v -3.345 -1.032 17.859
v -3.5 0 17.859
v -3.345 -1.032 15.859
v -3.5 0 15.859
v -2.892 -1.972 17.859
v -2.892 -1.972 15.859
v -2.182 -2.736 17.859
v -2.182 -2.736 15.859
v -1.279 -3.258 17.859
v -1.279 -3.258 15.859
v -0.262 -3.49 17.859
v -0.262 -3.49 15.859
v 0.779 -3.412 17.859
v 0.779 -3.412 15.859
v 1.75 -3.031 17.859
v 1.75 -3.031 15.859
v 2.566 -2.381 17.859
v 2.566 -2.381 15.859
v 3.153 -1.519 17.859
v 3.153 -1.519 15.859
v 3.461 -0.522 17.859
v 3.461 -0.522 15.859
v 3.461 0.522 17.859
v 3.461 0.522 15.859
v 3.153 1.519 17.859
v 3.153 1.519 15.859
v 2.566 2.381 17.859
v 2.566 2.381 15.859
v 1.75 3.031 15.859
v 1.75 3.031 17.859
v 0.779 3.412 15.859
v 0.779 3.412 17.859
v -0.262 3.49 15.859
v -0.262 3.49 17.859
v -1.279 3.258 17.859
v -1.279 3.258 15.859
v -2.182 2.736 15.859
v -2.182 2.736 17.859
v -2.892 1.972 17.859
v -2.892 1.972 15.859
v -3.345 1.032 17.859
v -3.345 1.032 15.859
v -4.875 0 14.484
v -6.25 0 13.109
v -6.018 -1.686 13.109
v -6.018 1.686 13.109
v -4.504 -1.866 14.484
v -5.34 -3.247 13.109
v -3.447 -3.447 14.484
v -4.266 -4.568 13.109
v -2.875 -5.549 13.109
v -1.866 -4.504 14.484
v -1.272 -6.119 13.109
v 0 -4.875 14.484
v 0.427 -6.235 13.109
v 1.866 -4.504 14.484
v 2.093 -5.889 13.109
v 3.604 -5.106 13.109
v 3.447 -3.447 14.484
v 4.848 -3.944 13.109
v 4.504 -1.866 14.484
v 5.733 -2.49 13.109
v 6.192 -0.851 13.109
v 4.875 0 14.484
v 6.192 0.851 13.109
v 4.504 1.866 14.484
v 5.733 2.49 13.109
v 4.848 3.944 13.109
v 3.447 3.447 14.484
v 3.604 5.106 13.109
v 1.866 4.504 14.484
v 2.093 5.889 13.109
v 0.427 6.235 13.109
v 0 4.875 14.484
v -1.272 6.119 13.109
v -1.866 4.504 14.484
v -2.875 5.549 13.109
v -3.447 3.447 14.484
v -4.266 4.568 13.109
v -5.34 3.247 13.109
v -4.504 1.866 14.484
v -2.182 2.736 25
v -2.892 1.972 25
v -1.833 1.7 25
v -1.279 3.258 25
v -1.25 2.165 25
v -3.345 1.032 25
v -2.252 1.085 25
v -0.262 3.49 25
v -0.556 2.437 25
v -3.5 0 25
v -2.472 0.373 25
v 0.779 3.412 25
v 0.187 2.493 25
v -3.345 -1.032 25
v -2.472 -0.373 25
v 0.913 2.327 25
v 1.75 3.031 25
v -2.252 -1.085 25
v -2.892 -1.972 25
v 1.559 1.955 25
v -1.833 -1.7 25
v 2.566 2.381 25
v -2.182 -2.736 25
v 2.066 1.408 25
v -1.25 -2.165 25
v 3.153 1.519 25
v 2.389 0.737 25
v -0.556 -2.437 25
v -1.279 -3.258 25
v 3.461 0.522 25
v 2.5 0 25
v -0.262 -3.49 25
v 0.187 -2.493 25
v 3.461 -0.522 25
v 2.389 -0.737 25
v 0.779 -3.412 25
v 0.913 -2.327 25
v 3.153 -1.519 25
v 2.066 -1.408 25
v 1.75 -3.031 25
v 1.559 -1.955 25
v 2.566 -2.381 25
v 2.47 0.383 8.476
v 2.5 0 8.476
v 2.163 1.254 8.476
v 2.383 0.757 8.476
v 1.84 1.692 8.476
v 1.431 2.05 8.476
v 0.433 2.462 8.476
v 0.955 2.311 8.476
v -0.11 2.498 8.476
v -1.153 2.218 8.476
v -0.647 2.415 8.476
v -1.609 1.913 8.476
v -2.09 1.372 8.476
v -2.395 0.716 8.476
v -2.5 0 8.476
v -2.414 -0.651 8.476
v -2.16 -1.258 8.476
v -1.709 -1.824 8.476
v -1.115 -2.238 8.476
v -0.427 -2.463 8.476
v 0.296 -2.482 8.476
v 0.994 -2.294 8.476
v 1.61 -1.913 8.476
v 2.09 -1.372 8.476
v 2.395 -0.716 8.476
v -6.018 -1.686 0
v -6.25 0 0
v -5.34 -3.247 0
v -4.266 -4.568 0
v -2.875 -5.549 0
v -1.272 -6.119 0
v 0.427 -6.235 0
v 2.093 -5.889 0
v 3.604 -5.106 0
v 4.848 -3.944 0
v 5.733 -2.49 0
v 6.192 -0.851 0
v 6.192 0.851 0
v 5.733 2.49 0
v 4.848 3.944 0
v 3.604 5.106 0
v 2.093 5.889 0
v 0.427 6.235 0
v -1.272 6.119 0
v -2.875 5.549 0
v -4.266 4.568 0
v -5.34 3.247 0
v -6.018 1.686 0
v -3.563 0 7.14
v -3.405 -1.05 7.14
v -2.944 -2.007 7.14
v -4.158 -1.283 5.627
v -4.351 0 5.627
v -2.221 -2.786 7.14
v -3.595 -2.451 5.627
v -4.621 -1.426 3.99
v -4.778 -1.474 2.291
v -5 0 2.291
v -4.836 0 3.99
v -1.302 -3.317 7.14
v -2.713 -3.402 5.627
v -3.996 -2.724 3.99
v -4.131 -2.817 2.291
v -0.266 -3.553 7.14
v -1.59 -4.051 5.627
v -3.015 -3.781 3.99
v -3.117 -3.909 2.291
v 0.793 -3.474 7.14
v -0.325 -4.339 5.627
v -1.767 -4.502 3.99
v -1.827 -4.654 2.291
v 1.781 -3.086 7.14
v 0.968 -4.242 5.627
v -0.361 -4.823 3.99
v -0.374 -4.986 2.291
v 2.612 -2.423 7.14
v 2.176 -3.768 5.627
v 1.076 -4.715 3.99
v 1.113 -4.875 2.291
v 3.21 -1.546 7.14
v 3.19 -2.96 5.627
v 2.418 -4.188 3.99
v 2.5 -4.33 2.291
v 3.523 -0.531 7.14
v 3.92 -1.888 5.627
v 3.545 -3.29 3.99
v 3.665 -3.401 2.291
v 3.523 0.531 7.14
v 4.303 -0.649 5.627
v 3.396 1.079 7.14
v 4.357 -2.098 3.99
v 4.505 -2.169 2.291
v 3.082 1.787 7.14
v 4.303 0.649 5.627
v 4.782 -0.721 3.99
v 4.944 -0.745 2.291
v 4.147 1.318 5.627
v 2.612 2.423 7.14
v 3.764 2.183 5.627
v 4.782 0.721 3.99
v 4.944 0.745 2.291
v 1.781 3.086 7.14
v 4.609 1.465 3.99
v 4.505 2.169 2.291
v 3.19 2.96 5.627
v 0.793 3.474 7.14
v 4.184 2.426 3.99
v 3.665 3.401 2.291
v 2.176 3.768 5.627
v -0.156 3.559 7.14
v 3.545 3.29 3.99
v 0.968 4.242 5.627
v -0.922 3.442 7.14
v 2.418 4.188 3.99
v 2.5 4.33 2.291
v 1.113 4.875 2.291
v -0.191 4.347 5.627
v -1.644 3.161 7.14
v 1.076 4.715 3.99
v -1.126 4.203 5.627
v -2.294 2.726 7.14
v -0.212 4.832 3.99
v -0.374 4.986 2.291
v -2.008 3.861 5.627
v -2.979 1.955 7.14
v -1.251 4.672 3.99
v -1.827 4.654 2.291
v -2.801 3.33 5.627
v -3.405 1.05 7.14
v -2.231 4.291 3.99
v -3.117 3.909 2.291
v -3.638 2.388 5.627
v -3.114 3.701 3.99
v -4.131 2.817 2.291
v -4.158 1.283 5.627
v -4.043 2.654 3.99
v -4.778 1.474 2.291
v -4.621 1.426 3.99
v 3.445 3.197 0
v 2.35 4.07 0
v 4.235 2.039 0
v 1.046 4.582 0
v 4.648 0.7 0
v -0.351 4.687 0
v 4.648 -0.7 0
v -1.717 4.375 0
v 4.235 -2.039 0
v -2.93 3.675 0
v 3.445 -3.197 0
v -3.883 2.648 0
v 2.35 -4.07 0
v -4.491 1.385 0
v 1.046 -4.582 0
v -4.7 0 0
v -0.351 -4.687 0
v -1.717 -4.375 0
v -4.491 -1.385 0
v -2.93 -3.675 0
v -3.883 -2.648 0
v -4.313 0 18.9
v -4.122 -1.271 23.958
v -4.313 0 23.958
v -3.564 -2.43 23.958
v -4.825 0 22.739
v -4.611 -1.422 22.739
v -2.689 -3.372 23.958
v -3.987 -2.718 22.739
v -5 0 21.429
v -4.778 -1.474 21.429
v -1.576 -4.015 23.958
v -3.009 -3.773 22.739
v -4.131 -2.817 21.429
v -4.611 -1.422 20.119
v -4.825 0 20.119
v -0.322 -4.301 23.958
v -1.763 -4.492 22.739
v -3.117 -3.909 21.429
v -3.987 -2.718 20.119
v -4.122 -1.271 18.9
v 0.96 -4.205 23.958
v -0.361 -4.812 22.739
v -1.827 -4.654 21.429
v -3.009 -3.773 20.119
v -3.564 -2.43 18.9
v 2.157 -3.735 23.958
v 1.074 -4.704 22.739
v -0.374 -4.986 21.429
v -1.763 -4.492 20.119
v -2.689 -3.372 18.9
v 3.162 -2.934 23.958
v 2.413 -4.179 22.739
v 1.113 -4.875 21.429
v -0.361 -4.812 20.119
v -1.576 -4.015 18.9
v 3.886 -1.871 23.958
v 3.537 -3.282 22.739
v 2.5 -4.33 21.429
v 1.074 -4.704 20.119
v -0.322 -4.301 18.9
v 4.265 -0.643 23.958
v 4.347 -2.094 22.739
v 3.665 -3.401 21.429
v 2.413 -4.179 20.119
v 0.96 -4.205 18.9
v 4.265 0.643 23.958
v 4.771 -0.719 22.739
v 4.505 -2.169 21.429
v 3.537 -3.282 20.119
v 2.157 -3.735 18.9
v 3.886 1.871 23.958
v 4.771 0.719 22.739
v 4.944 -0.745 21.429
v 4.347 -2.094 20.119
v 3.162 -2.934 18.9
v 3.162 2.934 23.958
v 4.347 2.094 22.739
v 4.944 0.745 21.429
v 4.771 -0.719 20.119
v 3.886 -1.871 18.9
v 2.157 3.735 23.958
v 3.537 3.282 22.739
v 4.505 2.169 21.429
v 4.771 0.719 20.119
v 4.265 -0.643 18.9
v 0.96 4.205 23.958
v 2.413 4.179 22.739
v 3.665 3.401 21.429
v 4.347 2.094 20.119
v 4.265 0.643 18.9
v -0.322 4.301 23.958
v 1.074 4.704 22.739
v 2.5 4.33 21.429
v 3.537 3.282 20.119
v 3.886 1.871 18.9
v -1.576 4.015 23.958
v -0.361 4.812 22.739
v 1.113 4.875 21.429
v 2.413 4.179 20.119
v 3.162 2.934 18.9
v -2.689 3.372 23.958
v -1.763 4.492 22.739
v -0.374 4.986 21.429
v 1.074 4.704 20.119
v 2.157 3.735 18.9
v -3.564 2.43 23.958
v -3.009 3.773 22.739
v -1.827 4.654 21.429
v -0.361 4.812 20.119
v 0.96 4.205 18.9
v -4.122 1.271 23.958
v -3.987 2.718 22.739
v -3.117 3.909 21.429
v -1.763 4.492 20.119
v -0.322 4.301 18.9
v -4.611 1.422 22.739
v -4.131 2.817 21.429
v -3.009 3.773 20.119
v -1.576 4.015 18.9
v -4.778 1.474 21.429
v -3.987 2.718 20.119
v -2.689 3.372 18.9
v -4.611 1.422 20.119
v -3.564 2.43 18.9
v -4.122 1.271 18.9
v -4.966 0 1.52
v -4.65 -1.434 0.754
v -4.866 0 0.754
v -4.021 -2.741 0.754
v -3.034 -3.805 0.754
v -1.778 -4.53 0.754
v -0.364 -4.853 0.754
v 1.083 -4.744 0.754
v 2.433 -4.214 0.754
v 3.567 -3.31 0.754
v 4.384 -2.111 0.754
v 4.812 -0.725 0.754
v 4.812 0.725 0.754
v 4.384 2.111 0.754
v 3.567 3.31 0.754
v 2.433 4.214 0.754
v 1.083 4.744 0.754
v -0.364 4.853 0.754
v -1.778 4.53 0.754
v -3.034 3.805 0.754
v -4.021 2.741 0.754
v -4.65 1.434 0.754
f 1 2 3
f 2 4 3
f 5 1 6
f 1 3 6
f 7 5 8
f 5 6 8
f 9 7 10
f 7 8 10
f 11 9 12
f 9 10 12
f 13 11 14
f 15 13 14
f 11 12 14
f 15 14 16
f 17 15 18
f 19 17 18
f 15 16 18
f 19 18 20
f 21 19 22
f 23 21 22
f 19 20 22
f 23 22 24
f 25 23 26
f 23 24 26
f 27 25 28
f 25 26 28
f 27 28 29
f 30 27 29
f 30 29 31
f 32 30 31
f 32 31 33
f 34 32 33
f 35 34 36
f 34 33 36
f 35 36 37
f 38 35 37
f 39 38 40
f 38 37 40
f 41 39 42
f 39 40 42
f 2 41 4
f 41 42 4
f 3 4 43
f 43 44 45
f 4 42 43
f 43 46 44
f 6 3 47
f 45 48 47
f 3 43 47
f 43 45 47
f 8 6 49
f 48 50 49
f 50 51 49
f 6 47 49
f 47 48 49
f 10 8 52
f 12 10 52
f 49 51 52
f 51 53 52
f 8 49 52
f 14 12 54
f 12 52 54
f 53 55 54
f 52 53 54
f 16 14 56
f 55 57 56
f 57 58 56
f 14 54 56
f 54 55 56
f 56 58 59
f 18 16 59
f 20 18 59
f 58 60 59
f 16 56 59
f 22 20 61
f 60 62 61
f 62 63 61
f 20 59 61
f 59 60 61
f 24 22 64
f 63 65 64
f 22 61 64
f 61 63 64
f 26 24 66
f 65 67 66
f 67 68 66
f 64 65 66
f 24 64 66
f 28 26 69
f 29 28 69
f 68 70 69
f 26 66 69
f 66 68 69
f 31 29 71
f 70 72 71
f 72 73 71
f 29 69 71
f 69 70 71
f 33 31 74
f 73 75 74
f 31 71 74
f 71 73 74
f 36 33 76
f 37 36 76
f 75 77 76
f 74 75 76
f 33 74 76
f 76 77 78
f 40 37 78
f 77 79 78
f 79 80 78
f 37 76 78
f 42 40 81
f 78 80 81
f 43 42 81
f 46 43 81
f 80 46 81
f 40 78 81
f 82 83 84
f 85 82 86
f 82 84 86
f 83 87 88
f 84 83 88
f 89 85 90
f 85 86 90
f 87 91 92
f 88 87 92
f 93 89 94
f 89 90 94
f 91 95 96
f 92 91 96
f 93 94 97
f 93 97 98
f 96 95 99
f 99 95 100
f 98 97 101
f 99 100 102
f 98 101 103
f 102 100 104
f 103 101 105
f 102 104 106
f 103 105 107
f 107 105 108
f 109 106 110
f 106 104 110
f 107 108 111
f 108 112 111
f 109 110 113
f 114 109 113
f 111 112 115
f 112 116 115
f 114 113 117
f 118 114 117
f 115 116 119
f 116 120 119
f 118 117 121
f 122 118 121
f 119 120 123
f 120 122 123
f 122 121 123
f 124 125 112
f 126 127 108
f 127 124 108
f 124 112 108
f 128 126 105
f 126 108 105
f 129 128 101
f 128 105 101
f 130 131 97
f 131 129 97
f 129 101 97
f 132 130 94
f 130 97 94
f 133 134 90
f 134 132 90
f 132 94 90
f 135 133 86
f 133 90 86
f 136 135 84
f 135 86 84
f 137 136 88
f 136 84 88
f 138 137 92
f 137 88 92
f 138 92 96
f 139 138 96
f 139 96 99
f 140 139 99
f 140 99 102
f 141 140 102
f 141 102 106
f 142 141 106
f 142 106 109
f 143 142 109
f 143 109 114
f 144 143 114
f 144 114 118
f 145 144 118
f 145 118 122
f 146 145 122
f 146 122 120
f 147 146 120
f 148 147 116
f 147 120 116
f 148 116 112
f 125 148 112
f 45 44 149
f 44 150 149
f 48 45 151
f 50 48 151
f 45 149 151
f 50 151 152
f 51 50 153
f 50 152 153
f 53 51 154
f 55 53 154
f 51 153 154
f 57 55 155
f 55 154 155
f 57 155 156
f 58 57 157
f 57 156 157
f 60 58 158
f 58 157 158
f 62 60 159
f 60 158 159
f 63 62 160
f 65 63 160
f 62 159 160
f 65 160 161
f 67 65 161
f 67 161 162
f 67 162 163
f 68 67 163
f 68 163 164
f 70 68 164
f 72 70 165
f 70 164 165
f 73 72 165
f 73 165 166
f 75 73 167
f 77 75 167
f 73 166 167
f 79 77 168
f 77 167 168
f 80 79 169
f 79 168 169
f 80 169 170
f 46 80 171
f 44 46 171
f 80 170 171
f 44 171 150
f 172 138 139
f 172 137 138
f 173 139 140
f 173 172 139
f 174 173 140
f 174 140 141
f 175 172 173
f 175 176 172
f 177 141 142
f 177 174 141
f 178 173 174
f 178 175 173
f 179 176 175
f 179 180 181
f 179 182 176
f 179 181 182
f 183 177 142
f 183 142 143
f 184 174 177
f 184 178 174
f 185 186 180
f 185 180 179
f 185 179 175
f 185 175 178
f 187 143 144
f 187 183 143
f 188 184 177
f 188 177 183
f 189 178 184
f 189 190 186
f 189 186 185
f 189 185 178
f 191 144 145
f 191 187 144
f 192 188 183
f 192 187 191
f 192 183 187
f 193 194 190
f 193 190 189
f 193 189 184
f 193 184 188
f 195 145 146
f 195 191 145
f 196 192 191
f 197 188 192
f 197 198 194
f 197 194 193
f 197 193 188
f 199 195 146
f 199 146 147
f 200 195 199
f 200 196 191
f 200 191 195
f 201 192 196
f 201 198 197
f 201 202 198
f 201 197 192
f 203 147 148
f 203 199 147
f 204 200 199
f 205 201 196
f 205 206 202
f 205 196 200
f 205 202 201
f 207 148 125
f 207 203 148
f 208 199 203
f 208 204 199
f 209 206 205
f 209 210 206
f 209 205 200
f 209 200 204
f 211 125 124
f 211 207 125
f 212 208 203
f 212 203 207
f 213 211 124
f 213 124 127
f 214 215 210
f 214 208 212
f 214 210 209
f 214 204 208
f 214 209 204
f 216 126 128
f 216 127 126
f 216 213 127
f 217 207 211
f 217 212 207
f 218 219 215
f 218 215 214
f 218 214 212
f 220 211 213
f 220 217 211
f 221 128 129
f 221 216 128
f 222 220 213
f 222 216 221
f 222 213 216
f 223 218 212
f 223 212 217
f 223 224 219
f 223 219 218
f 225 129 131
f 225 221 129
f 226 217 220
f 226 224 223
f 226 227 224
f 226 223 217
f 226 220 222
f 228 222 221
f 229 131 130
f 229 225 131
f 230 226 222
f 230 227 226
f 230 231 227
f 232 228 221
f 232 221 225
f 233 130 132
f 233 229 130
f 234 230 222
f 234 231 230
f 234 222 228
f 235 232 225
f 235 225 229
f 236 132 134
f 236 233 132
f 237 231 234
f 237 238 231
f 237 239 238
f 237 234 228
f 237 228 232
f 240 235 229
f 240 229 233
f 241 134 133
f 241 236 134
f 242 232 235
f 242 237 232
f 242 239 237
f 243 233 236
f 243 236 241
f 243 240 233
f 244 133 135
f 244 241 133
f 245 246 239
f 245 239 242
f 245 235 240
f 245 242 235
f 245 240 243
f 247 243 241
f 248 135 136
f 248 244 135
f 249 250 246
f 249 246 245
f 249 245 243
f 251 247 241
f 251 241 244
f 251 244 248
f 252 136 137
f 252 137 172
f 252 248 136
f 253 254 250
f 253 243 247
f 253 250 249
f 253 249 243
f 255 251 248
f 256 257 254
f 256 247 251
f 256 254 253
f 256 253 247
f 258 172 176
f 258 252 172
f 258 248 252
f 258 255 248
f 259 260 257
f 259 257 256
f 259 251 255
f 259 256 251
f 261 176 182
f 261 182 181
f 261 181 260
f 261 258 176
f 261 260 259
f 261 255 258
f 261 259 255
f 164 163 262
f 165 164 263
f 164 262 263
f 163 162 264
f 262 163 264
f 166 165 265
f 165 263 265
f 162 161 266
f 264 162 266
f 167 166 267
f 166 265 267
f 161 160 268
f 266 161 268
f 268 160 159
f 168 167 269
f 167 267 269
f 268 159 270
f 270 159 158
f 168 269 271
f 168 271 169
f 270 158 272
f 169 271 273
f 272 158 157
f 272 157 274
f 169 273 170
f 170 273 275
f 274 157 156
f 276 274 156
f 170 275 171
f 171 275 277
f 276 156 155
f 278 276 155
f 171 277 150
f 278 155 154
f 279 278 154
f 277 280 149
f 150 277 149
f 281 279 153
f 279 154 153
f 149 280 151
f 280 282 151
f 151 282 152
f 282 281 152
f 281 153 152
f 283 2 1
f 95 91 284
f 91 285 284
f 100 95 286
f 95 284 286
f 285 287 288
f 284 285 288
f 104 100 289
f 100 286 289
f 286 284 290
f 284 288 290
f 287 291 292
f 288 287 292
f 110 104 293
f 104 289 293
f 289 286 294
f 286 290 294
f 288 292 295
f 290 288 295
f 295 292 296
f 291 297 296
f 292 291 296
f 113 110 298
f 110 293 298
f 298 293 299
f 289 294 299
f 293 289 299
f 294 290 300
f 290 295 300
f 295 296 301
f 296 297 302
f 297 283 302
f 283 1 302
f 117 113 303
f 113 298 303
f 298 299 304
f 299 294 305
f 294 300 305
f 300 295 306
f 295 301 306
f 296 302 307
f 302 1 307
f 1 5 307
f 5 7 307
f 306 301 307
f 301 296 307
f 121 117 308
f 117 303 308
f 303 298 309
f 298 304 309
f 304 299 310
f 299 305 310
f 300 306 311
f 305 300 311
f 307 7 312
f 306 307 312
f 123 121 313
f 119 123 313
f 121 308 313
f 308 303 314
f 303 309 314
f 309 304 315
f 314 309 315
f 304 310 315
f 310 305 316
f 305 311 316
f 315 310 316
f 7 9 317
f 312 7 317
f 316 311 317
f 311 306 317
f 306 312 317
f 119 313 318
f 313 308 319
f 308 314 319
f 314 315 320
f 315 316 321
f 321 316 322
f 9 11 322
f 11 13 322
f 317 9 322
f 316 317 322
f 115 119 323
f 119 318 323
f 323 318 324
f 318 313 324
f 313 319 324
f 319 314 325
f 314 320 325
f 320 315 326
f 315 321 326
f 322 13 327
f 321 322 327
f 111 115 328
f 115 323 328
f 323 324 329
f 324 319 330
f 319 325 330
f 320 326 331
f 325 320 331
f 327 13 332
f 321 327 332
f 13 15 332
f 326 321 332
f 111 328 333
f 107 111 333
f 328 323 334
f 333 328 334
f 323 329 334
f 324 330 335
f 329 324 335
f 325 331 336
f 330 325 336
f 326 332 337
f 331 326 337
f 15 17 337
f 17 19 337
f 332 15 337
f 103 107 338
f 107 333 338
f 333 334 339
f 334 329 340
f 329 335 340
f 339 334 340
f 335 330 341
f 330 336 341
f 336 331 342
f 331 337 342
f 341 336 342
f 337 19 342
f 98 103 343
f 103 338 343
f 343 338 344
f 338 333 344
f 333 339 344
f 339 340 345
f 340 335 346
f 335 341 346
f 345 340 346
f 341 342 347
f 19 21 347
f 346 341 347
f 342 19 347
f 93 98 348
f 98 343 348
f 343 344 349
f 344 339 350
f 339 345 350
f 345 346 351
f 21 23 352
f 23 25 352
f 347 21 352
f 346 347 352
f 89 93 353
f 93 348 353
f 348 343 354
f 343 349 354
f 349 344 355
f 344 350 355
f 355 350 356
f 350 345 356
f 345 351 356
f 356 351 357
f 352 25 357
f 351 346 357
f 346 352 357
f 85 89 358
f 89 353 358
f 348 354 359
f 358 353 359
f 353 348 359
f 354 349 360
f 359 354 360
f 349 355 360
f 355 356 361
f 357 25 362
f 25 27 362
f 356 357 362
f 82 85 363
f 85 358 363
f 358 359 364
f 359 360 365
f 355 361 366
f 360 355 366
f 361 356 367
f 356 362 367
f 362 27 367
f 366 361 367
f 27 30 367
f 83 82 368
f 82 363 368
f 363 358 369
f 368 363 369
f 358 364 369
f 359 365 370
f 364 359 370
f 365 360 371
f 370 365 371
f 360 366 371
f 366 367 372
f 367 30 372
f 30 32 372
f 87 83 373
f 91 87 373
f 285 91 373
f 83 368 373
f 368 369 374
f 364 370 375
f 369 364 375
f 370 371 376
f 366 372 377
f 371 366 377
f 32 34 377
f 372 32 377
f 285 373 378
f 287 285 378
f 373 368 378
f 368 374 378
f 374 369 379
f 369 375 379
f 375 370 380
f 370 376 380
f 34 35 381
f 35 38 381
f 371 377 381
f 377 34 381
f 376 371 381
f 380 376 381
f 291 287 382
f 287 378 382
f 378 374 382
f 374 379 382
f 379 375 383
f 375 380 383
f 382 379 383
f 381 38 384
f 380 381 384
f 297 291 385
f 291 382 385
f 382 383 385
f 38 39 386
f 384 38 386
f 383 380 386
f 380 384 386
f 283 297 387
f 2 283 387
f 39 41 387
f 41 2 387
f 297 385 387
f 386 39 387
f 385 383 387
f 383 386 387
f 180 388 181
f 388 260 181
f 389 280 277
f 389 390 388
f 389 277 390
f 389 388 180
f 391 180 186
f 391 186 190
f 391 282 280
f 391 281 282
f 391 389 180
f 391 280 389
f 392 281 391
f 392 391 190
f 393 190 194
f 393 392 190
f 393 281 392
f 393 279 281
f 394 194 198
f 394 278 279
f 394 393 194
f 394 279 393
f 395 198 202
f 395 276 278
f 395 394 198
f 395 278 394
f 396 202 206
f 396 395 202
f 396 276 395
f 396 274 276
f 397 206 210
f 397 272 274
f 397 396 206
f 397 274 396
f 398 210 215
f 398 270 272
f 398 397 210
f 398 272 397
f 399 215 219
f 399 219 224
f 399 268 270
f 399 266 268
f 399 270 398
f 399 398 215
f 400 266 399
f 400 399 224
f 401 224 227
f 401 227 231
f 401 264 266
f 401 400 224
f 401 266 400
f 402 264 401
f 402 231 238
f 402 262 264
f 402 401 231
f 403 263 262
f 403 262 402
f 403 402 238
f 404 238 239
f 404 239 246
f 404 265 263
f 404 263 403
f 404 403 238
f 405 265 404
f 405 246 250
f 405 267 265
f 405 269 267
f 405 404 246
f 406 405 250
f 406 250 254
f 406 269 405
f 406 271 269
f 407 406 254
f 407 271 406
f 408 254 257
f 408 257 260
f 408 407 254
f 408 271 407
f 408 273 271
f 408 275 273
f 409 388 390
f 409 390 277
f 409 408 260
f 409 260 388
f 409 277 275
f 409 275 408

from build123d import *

# Parameters (mm, degrees)
F4_R     = 2.5
F5_DEPTH = 25.001


with BuildPart() as f1:
    # F0 (on Front) → F1 (revolve)
    with BuildSketch(Plane.XZ):
        with BuildLine():
            Line((-6.25, 13.108572), (-6.25, 0))
            Line((-6.25, 0), (0, 0))
            Line((0, 0), (0, 25))
            Line((0, 25), (-3.5, 25))
            ThreePointArc((-3.5, 25), (-5, 21.429286), (-3.5, 17.858572))
            Line((-3.5, 17.858572), (-3.5, 15.858572))
            Line((-3.5, 15.858572), (-6.25, 13.108572))
        make_face()
    revolve(axis=Axis((0, 0, 12.5), (0, 0, 1)))

    # F2 (on Front) → F3 (revolve, cut)
    with BuildSketch(Plane.XZ):
        with BuildLine():
            Line((0, 0), (0, 7.291288))
            ThreePointArc((0, 7.291288), (-3.535534, 5.826822), (-5, 2.291288))
            ThreePointArc((-5, 2.291288), (-4.859037, 1.112408), (-4.444097, 0))
            Line((-4.444097, 0), (0, 0))
        make_face()
        with BuildLine():
            ThreePointArc((-5, 2.291288), (-3.535534, 5.826822), (0, 7.291288))
            Line((0, 7.291288), (0, 10.291288))
            ThreePointArc((0, 10.291288), (-3.647185, 7.008278), (-5, 2.291288))
        make_face()
        with BuildLine():
            ThreePointArc((-4.444097, 0), (-4.859037, 1.112408), (-5, 2.291288))
            ThreePointArc((-5, 2.291288), (-4.924681, 1.135866), (-4.7, 0))
            Line((-4.7, 0), (-4.444097, 0))
        make_face()
    revolve(axis=Axis((0, 0, 2.291288), (0, 0, 1)), mode=Mode.SUBTRACT)

    # F4 (on face) → F5 (cut, through all)
    with BuildSketch(Plane.XY.offset(25)):
        Circle(F4_R)
    extrude(amount=-F5_DEPTH, mode=Mode.SUBTRACT)


solid = f1.part
